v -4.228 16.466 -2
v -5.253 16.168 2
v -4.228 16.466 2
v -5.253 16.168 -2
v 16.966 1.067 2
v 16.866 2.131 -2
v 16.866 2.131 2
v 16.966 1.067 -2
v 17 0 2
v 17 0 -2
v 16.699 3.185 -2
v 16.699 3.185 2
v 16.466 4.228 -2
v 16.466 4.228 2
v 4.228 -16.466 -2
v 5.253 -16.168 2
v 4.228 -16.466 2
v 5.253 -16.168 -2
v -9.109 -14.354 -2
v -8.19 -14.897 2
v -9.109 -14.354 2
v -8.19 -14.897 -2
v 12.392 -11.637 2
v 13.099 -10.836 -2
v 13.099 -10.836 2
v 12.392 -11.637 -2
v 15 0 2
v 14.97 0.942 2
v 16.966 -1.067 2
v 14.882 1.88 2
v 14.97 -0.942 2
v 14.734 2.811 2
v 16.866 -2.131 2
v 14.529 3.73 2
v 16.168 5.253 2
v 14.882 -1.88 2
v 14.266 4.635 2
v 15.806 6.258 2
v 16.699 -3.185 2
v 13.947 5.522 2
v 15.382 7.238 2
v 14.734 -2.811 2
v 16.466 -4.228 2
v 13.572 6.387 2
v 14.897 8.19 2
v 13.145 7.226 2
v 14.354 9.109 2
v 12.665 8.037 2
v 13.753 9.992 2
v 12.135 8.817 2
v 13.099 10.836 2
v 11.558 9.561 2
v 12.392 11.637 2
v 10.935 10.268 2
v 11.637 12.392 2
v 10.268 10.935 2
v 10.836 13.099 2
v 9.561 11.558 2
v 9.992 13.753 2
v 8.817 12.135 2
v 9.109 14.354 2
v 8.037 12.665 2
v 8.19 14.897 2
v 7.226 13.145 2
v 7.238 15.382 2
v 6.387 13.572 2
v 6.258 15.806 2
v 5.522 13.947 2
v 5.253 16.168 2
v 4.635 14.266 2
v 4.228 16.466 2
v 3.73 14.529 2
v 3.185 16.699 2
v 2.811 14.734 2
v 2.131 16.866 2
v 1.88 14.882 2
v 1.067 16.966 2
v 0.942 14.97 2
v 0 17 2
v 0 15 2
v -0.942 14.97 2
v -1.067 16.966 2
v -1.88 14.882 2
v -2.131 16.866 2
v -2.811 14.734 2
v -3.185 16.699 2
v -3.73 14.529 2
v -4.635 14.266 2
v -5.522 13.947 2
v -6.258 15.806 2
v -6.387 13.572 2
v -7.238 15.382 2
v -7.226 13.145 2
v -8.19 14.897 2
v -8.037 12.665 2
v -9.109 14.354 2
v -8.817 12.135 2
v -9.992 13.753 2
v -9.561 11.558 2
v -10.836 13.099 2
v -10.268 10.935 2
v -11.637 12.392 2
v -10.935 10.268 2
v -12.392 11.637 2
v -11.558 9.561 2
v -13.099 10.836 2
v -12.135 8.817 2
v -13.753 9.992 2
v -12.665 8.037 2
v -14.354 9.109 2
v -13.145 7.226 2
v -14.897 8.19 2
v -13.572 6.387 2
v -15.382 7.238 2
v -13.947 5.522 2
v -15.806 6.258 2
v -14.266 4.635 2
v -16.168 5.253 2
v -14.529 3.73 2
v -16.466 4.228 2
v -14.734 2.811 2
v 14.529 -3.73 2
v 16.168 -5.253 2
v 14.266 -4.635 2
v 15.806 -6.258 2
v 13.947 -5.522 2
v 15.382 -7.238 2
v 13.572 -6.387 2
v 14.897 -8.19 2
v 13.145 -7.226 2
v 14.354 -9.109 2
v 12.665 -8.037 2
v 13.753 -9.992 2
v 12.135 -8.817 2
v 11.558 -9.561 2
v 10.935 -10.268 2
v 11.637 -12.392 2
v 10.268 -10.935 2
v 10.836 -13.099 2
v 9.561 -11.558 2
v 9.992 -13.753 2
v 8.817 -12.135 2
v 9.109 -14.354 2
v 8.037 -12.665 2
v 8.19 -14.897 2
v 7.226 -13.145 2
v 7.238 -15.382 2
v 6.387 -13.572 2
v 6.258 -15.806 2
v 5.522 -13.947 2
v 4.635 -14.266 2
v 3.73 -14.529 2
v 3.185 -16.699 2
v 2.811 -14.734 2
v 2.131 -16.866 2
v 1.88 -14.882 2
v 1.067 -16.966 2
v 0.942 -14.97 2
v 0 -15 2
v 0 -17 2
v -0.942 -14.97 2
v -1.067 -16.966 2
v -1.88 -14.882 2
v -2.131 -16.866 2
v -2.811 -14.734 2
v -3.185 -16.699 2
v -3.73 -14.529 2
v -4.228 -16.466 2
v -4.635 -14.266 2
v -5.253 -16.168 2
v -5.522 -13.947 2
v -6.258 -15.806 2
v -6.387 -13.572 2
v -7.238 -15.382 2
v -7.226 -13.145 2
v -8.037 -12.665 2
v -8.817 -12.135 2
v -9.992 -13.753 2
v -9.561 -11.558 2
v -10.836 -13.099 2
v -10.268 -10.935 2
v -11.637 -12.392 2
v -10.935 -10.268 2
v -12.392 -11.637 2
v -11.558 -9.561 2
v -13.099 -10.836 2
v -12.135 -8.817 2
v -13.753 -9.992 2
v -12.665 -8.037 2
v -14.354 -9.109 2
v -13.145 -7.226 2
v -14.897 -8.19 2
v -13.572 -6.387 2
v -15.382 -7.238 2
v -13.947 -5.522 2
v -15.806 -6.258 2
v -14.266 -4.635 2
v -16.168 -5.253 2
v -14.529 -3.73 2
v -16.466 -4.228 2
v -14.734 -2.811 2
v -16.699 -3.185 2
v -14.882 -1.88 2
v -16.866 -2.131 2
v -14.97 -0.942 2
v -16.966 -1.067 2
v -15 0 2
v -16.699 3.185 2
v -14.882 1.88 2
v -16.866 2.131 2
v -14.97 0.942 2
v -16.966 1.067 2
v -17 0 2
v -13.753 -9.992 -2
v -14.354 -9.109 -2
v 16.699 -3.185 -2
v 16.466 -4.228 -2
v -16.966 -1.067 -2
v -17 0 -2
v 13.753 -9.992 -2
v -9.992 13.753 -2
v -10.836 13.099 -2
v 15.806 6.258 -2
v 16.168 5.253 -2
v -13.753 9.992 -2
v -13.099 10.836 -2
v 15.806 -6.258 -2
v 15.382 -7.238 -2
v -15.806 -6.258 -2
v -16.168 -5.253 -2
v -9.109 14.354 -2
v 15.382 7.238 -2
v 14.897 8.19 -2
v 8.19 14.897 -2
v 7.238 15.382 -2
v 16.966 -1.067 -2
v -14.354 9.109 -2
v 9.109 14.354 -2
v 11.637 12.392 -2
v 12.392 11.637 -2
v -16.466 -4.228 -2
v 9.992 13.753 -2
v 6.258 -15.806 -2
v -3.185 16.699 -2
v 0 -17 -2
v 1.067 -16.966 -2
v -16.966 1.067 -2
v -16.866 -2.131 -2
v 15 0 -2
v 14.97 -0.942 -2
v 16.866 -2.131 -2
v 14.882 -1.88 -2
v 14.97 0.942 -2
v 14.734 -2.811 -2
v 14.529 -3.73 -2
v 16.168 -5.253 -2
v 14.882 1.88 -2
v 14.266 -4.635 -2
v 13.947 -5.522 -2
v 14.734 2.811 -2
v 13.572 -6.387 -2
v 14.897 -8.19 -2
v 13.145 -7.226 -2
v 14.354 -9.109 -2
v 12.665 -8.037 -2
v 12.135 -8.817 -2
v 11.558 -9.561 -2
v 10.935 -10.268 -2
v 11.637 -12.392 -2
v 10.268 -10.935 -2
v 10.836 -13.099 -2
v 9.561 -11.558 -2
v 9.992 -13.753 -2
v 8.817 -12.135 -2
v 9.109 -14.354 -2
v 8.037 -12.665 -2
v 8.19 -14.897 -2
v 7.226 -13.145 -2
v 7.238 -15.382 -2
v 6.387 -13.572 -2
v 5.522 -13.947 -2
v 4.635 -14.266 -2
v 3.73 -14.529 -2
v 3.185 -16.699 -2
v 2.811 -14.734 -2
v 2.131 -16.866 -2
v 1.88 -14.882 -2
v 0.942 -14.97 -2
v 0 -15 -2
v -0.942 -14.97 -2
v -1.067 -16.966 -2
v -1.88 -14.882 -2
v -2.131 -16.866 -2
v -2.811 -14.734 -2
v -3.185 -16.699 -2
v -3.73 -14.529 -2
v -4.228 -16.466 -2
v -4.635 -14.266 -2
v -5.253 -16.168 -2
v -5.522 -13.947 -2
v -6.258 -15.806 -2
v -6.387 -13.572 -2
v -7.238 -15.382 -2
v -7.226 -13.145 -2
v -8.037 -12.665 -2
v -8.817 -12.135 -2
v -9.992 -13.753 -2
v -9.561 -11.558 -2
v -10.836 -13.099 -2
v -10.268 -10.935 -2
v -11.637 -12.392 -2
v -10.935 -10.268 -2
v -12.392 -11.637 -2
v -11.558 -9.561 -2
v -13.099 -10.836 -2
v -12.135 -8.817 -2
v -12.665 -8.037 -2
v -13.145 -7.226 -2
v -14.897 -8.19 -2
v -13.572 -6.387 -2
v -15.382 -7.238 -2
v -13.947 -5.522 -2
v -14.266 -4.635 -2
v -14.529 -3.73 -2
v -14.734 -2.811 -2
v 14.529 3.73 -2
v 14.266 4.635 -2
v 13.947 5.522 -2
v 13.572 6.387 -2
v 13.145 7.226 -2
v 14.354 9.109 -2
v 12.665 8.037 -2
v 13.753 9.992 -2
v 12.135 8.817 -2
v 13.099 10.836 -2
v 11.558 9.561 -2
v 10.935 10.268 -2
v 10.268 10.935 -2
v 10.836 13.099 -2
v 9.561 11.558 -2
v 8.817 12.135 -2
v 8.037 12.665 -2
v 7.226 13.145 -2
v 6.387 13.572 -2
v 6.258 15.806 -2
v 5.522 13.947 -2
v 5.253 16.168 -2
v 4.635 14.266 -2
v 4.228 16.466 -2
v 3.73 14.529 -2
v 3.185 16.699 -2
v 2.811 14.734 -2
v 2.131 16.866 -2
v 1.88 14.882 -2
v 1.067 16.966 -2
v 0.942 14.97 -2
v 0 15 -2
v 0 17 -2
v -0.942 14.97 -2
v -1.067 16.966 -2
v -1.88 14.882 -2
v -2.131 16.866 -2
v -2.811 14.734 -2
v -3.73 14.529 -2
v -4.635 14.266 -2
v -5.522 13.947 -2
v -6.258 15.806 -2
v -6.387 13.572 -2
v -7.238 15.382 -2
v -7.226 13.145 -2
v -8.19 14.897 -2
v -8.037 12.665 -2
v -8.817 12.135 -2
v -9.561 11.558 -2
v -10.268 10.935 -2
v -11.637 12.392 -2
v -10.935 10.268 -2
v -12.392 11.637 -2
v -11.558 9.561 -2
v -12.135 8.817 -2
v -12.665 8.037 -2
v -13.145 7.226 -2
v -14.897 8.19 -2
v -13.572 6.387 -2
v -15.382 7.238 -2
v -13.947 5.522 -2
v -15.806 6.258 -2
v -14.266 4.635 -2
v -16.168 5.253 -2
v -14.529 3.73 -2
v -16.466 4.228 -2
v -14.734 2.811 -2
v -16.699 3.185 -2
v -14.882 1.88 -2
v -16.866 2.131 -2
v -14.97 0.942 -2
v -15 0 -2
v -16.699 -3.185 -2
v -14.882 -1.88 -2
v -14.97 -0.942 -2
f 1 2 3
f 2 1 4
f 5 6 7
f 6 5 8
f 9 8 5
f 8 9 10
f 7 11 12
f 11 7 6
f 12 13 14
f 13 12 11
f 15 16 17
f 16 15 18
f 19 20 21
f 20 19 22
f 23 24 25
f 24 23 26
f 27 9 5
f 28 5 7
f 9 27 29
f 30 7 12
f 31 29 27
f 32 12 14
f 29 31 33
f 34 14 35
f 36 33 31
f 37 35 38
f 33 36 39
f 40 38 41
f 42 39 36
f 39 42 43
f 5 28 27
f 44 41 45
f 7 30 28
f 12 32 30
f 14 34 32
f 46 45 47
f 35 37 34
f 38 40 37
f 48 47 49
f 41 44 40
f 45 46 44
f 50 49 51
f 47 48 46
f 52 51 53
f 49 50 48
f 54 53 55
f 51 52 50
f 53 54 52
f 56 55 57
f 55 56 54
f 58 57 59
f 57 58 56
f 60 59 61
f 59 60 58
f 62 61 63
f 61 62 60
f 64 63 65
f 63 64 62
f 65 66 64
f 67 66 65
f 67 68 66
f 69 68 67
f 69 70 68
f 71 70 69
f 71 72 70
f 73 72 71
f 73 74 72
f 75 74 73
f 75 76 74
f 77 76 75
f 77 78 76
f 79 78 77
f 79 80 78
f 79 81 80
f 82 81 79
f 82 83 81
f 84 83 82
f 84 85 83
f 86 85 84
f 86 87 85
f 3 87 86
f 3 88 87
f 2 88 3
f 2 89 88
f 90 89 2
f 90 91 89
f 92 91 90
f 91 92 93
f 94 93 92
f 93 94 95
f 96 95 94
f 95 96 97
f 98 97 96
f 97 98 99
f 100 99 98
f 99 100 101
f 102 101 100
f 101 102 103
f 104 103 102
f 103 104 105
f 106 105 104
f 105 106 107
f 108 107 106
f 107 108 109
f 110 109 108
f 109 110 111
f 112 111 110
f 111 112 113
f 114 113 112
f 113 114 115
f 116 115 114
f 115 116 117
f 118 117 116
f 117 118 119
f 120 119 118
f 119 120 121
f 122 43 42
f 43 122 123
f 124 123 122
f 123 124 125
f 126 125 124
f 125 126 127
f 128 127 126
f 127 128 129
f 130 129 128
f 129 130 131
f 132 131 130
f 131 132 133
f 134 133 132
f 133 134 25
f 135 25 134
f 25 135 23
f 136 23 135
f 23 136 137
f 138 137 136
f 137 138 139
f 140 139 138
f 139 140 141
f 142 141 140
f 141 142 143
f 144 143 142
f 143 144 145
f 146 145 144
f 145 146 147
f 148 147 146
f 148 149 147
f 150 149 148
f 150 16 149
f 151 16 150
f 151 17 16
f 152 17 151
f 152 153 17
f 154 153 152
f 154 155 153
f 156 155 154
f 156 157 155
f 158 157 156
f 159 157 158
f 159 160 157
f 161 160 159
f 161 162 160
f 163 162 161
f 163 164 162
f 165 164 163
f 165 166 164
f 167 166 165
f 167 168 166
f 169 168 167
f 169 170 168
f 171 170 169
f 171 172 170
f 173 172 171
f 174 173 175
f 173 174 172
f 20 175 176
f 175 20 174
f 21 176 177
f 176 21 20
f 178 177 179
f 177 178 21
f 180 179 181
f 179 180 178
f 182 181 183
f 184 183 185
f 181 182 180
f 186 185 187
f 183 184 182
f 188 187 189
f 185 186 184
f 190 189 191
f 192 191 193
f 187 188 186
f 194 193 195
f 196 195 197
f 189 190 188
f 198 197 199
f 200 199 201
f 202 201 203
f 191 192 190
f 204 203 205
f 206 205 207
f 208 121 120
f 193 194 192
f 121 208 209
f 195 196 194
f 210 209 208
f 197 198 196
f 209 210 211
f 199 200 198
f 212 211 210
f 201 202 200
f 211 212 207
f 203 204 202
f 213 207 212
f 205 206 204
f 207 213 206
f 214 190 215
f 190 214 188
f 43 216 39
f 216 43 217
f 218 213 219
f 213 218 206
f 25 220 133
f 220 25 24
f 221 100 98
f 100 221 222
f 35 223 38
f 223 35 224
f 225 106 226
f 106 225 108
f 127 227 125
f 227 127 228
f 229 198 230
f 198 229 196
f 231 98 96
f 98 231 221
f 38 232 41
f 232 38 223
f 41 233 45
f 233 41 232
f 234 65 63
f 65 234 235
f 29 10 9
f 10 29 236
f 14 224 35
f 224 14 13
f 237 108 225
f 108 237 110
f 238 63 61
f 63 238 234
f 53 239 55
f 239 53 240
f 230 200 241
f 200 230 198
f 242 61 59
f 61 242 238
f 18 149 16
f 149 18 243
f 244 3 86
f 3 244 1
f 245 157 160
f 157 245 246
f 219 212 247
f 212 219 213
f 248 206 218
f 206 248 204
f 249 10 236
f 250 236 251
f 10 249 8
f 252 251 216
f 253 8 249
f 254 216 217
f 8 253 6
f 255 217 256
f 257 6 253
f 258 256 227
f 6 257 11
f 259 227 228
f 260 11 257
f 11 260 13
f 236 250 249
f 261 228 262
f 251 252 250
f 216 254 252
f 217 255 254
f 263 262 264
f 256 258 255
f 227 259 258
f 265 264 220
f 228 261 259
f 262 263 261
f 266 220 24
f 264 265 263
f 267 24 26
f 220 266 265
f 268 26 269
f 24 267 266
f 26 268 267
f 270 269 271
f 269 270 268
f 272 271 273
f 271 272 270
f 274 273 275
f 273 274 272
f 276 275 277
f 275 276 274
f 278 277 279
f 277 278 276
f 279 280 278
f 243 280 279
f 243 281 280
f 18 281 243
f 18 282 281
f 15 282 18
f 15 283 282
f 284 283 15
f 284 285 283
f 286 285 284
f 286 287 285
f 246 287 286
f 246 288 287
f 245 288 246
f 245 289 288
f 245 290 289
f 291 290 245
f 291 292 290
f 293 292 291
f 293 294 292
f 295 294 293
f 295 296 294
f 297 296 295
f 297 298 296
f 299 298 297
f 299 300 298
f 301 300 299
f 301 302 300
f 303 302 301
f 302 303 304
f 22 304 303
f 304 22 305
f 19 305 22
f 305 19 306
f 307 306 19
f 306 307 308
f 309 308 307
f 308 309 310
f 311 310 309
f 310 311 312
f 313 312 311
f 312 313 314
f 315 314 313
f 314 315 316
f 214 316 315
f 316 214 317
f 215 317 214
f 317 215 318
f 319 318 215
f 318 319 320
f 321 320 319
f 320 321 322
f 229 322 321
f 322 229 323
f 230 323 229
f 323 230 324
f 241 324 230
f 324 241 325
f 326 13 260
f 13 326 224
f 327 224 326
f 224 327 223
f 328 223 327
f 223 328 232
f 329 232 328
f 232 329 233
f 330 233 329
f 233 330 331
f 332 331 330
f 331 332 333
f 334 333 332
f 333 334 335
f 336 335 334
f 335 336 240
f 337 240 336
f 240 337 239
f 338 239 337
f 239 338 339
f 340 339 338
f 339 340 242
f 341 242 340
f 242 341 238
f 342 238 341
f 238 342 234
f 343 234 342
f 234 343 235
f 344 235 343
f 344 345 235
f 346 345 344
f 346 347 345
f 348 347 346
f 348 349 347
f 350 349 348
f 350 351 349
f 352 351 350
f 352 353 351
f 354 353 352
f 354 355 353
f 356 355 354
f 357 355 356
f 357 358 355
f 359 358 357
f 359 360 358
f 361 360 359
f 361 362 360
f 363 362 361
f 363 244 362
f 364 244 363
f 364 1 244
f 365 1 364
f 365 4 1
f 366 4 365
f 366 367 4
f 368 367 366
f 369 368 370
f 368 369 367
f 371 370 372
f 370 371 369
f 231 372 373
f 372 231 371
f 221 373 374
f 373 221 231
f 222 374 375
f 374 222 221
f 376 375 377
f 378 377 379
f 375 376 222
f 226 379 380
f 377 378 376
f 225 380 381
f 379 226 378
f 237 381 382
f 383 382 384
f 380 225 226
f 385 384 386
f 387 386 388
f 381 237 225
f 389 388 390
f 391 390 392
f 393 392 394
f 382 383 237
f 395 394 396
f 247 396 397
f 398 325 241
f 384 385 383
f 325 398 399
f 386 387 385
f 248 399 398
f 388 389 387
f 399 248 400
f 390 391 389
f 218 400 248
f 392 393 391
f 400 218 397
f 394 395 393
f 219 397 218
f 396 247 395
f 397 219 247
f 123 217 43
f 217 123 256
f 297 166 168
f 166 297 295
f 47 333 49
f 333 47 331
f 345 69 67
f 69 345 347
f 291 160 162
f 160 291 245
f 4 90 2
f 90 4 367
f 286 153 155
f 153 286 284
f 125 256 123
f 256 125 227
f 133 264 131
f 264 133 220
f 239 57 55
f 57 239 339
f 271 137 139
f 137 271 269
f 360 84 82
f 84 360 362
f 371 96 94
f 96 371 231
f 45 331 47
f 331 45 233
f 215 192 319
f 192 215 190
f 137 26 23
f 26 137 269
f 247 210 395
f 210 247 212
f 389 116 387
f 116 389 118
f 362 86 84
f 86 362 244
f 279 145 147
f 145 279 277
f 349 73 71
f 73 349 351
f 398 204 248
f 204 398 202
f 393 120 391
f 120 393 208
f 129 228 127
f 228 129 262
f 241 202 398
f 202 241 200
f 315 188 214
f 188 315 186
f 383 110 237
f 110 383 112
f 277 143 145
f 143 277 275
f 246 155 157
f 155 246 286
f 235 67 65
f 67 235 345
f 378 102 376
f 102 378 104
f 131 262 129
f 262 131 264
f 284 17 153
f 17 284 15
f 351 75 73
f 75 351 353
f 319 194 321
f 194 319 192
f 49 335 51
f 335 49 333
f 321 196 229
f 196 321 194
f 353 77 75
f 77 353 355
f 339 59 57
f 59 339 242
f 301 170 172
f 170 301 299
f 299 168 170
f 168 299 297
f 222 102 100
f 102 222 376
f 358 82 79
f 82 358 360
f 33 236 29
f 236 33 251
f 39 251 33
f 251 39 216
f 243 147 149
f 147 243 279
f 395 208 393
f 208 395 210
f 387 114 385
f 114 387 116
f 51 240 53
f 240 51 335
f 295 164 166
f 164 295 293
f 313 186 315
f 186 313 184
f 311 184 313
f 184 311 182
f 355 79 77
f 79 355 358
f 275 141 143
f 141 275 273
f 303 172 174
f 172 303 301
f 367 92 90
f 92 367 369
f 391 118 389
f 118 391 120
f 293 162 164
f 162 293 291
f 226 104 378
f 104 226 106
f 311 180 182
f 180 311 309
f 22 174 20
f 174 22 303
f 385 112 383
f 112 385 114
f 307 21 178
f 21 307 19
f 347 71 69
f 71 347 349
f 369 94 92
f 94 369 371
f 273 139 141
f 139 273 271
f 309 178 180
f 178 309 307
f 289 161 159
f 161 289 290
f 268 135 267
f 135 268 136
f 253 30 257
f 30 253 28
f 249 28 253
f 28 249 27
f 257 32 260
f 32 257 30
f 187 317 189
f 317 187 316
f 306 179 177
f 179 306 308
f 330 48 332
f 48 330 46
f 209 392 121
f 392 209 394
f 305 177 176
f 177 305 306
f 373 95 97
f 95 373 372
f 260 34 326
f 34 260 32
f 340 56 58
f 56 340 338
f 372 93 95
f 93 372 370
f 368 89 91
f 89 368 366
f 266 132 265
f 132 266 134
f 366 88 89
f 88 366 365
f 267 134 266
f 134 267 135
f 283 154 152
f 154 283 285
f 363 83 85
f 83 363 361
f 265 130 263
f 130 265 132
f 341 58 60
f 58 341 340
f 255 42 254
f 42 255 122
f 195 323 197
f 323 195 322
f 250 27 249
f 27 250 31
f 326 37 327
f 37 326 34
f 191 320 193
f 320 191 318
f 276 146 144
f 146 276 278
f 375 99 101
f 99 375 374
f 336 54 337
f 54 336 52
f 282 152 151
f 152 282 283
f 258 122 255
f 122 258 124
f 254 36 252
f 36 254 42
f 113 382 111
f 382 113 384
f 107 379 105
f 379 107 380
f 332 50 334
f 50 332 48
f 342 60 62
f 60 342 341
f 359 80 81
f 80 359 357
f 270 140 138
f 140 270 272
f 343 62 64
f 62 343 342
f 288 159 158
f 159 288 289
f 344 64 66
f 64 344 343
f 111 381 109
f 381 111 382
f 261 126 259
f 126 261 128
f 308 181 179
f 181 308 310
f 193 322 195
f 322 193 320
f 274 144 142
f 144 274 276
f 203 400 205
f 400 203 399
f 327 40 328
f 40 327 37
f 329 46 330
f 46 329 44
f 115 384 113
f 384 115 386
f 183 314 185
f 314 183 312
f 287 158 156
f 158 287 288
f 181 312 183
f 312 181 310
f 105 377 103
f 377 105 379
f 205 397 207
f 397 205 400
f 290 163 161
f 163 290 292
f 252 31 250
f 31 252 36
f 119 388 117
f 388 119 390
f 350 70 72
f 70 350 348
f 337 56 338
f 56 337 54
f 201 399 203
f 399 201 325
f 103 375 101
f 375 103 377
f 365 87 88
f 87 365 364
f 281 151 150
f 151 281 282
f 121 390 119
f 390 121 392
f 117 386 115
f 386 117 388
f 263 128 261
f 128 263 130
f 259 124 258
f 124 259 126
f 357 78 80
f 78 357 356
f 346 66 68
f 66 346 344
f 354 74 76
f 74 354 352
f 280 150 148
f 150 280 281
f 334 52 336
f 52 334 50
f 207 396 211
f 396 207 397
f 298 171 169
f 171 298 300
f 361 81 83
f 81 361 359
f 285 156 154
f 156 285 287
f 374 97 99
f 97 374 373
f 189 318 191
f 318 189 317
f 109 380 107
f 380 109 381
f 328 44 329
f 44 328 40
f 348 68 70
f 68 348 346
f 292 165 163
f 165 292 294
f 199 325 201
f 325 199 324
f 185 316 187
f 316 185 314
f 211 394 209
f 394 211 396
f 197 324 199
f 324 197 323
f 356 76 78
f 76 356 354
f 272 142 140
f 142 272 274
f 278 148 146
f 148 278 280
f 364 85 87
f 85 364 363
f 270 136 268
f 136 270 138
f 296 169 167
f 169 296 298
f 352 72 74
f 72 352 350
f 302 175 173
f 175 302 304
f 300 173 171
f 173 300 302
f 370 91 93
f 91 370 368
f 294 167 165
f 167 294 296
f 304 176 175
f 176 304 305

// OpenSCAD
// washer.scad
// library for parametric washer, bushing, spacer, ring or gasket
// Author: Tony Z. Tonchev, Michigan (USA) 
// last update: October 2018


// (in mm)
Outside_Diameter = 34;

// (in mm)
Inside_Diameter = 30;

// (in mm)
Thickness = 4;

/* [Hidden] */

$fn=100;
TZT_WASHER (Thickness, Outside_Diameter/2, Inside_Diameter/2);

module TZT_WASHER (TZT_Thk, TZT_RadA, TZT_RadB) {
    difference () {
        cylinder (TZT_Thk, TZT_RadA, TZT_RadA, true);
        cylinder (TZT_Thk+1, TZT_RadB, TZT_RadB, true);
    }
} 
